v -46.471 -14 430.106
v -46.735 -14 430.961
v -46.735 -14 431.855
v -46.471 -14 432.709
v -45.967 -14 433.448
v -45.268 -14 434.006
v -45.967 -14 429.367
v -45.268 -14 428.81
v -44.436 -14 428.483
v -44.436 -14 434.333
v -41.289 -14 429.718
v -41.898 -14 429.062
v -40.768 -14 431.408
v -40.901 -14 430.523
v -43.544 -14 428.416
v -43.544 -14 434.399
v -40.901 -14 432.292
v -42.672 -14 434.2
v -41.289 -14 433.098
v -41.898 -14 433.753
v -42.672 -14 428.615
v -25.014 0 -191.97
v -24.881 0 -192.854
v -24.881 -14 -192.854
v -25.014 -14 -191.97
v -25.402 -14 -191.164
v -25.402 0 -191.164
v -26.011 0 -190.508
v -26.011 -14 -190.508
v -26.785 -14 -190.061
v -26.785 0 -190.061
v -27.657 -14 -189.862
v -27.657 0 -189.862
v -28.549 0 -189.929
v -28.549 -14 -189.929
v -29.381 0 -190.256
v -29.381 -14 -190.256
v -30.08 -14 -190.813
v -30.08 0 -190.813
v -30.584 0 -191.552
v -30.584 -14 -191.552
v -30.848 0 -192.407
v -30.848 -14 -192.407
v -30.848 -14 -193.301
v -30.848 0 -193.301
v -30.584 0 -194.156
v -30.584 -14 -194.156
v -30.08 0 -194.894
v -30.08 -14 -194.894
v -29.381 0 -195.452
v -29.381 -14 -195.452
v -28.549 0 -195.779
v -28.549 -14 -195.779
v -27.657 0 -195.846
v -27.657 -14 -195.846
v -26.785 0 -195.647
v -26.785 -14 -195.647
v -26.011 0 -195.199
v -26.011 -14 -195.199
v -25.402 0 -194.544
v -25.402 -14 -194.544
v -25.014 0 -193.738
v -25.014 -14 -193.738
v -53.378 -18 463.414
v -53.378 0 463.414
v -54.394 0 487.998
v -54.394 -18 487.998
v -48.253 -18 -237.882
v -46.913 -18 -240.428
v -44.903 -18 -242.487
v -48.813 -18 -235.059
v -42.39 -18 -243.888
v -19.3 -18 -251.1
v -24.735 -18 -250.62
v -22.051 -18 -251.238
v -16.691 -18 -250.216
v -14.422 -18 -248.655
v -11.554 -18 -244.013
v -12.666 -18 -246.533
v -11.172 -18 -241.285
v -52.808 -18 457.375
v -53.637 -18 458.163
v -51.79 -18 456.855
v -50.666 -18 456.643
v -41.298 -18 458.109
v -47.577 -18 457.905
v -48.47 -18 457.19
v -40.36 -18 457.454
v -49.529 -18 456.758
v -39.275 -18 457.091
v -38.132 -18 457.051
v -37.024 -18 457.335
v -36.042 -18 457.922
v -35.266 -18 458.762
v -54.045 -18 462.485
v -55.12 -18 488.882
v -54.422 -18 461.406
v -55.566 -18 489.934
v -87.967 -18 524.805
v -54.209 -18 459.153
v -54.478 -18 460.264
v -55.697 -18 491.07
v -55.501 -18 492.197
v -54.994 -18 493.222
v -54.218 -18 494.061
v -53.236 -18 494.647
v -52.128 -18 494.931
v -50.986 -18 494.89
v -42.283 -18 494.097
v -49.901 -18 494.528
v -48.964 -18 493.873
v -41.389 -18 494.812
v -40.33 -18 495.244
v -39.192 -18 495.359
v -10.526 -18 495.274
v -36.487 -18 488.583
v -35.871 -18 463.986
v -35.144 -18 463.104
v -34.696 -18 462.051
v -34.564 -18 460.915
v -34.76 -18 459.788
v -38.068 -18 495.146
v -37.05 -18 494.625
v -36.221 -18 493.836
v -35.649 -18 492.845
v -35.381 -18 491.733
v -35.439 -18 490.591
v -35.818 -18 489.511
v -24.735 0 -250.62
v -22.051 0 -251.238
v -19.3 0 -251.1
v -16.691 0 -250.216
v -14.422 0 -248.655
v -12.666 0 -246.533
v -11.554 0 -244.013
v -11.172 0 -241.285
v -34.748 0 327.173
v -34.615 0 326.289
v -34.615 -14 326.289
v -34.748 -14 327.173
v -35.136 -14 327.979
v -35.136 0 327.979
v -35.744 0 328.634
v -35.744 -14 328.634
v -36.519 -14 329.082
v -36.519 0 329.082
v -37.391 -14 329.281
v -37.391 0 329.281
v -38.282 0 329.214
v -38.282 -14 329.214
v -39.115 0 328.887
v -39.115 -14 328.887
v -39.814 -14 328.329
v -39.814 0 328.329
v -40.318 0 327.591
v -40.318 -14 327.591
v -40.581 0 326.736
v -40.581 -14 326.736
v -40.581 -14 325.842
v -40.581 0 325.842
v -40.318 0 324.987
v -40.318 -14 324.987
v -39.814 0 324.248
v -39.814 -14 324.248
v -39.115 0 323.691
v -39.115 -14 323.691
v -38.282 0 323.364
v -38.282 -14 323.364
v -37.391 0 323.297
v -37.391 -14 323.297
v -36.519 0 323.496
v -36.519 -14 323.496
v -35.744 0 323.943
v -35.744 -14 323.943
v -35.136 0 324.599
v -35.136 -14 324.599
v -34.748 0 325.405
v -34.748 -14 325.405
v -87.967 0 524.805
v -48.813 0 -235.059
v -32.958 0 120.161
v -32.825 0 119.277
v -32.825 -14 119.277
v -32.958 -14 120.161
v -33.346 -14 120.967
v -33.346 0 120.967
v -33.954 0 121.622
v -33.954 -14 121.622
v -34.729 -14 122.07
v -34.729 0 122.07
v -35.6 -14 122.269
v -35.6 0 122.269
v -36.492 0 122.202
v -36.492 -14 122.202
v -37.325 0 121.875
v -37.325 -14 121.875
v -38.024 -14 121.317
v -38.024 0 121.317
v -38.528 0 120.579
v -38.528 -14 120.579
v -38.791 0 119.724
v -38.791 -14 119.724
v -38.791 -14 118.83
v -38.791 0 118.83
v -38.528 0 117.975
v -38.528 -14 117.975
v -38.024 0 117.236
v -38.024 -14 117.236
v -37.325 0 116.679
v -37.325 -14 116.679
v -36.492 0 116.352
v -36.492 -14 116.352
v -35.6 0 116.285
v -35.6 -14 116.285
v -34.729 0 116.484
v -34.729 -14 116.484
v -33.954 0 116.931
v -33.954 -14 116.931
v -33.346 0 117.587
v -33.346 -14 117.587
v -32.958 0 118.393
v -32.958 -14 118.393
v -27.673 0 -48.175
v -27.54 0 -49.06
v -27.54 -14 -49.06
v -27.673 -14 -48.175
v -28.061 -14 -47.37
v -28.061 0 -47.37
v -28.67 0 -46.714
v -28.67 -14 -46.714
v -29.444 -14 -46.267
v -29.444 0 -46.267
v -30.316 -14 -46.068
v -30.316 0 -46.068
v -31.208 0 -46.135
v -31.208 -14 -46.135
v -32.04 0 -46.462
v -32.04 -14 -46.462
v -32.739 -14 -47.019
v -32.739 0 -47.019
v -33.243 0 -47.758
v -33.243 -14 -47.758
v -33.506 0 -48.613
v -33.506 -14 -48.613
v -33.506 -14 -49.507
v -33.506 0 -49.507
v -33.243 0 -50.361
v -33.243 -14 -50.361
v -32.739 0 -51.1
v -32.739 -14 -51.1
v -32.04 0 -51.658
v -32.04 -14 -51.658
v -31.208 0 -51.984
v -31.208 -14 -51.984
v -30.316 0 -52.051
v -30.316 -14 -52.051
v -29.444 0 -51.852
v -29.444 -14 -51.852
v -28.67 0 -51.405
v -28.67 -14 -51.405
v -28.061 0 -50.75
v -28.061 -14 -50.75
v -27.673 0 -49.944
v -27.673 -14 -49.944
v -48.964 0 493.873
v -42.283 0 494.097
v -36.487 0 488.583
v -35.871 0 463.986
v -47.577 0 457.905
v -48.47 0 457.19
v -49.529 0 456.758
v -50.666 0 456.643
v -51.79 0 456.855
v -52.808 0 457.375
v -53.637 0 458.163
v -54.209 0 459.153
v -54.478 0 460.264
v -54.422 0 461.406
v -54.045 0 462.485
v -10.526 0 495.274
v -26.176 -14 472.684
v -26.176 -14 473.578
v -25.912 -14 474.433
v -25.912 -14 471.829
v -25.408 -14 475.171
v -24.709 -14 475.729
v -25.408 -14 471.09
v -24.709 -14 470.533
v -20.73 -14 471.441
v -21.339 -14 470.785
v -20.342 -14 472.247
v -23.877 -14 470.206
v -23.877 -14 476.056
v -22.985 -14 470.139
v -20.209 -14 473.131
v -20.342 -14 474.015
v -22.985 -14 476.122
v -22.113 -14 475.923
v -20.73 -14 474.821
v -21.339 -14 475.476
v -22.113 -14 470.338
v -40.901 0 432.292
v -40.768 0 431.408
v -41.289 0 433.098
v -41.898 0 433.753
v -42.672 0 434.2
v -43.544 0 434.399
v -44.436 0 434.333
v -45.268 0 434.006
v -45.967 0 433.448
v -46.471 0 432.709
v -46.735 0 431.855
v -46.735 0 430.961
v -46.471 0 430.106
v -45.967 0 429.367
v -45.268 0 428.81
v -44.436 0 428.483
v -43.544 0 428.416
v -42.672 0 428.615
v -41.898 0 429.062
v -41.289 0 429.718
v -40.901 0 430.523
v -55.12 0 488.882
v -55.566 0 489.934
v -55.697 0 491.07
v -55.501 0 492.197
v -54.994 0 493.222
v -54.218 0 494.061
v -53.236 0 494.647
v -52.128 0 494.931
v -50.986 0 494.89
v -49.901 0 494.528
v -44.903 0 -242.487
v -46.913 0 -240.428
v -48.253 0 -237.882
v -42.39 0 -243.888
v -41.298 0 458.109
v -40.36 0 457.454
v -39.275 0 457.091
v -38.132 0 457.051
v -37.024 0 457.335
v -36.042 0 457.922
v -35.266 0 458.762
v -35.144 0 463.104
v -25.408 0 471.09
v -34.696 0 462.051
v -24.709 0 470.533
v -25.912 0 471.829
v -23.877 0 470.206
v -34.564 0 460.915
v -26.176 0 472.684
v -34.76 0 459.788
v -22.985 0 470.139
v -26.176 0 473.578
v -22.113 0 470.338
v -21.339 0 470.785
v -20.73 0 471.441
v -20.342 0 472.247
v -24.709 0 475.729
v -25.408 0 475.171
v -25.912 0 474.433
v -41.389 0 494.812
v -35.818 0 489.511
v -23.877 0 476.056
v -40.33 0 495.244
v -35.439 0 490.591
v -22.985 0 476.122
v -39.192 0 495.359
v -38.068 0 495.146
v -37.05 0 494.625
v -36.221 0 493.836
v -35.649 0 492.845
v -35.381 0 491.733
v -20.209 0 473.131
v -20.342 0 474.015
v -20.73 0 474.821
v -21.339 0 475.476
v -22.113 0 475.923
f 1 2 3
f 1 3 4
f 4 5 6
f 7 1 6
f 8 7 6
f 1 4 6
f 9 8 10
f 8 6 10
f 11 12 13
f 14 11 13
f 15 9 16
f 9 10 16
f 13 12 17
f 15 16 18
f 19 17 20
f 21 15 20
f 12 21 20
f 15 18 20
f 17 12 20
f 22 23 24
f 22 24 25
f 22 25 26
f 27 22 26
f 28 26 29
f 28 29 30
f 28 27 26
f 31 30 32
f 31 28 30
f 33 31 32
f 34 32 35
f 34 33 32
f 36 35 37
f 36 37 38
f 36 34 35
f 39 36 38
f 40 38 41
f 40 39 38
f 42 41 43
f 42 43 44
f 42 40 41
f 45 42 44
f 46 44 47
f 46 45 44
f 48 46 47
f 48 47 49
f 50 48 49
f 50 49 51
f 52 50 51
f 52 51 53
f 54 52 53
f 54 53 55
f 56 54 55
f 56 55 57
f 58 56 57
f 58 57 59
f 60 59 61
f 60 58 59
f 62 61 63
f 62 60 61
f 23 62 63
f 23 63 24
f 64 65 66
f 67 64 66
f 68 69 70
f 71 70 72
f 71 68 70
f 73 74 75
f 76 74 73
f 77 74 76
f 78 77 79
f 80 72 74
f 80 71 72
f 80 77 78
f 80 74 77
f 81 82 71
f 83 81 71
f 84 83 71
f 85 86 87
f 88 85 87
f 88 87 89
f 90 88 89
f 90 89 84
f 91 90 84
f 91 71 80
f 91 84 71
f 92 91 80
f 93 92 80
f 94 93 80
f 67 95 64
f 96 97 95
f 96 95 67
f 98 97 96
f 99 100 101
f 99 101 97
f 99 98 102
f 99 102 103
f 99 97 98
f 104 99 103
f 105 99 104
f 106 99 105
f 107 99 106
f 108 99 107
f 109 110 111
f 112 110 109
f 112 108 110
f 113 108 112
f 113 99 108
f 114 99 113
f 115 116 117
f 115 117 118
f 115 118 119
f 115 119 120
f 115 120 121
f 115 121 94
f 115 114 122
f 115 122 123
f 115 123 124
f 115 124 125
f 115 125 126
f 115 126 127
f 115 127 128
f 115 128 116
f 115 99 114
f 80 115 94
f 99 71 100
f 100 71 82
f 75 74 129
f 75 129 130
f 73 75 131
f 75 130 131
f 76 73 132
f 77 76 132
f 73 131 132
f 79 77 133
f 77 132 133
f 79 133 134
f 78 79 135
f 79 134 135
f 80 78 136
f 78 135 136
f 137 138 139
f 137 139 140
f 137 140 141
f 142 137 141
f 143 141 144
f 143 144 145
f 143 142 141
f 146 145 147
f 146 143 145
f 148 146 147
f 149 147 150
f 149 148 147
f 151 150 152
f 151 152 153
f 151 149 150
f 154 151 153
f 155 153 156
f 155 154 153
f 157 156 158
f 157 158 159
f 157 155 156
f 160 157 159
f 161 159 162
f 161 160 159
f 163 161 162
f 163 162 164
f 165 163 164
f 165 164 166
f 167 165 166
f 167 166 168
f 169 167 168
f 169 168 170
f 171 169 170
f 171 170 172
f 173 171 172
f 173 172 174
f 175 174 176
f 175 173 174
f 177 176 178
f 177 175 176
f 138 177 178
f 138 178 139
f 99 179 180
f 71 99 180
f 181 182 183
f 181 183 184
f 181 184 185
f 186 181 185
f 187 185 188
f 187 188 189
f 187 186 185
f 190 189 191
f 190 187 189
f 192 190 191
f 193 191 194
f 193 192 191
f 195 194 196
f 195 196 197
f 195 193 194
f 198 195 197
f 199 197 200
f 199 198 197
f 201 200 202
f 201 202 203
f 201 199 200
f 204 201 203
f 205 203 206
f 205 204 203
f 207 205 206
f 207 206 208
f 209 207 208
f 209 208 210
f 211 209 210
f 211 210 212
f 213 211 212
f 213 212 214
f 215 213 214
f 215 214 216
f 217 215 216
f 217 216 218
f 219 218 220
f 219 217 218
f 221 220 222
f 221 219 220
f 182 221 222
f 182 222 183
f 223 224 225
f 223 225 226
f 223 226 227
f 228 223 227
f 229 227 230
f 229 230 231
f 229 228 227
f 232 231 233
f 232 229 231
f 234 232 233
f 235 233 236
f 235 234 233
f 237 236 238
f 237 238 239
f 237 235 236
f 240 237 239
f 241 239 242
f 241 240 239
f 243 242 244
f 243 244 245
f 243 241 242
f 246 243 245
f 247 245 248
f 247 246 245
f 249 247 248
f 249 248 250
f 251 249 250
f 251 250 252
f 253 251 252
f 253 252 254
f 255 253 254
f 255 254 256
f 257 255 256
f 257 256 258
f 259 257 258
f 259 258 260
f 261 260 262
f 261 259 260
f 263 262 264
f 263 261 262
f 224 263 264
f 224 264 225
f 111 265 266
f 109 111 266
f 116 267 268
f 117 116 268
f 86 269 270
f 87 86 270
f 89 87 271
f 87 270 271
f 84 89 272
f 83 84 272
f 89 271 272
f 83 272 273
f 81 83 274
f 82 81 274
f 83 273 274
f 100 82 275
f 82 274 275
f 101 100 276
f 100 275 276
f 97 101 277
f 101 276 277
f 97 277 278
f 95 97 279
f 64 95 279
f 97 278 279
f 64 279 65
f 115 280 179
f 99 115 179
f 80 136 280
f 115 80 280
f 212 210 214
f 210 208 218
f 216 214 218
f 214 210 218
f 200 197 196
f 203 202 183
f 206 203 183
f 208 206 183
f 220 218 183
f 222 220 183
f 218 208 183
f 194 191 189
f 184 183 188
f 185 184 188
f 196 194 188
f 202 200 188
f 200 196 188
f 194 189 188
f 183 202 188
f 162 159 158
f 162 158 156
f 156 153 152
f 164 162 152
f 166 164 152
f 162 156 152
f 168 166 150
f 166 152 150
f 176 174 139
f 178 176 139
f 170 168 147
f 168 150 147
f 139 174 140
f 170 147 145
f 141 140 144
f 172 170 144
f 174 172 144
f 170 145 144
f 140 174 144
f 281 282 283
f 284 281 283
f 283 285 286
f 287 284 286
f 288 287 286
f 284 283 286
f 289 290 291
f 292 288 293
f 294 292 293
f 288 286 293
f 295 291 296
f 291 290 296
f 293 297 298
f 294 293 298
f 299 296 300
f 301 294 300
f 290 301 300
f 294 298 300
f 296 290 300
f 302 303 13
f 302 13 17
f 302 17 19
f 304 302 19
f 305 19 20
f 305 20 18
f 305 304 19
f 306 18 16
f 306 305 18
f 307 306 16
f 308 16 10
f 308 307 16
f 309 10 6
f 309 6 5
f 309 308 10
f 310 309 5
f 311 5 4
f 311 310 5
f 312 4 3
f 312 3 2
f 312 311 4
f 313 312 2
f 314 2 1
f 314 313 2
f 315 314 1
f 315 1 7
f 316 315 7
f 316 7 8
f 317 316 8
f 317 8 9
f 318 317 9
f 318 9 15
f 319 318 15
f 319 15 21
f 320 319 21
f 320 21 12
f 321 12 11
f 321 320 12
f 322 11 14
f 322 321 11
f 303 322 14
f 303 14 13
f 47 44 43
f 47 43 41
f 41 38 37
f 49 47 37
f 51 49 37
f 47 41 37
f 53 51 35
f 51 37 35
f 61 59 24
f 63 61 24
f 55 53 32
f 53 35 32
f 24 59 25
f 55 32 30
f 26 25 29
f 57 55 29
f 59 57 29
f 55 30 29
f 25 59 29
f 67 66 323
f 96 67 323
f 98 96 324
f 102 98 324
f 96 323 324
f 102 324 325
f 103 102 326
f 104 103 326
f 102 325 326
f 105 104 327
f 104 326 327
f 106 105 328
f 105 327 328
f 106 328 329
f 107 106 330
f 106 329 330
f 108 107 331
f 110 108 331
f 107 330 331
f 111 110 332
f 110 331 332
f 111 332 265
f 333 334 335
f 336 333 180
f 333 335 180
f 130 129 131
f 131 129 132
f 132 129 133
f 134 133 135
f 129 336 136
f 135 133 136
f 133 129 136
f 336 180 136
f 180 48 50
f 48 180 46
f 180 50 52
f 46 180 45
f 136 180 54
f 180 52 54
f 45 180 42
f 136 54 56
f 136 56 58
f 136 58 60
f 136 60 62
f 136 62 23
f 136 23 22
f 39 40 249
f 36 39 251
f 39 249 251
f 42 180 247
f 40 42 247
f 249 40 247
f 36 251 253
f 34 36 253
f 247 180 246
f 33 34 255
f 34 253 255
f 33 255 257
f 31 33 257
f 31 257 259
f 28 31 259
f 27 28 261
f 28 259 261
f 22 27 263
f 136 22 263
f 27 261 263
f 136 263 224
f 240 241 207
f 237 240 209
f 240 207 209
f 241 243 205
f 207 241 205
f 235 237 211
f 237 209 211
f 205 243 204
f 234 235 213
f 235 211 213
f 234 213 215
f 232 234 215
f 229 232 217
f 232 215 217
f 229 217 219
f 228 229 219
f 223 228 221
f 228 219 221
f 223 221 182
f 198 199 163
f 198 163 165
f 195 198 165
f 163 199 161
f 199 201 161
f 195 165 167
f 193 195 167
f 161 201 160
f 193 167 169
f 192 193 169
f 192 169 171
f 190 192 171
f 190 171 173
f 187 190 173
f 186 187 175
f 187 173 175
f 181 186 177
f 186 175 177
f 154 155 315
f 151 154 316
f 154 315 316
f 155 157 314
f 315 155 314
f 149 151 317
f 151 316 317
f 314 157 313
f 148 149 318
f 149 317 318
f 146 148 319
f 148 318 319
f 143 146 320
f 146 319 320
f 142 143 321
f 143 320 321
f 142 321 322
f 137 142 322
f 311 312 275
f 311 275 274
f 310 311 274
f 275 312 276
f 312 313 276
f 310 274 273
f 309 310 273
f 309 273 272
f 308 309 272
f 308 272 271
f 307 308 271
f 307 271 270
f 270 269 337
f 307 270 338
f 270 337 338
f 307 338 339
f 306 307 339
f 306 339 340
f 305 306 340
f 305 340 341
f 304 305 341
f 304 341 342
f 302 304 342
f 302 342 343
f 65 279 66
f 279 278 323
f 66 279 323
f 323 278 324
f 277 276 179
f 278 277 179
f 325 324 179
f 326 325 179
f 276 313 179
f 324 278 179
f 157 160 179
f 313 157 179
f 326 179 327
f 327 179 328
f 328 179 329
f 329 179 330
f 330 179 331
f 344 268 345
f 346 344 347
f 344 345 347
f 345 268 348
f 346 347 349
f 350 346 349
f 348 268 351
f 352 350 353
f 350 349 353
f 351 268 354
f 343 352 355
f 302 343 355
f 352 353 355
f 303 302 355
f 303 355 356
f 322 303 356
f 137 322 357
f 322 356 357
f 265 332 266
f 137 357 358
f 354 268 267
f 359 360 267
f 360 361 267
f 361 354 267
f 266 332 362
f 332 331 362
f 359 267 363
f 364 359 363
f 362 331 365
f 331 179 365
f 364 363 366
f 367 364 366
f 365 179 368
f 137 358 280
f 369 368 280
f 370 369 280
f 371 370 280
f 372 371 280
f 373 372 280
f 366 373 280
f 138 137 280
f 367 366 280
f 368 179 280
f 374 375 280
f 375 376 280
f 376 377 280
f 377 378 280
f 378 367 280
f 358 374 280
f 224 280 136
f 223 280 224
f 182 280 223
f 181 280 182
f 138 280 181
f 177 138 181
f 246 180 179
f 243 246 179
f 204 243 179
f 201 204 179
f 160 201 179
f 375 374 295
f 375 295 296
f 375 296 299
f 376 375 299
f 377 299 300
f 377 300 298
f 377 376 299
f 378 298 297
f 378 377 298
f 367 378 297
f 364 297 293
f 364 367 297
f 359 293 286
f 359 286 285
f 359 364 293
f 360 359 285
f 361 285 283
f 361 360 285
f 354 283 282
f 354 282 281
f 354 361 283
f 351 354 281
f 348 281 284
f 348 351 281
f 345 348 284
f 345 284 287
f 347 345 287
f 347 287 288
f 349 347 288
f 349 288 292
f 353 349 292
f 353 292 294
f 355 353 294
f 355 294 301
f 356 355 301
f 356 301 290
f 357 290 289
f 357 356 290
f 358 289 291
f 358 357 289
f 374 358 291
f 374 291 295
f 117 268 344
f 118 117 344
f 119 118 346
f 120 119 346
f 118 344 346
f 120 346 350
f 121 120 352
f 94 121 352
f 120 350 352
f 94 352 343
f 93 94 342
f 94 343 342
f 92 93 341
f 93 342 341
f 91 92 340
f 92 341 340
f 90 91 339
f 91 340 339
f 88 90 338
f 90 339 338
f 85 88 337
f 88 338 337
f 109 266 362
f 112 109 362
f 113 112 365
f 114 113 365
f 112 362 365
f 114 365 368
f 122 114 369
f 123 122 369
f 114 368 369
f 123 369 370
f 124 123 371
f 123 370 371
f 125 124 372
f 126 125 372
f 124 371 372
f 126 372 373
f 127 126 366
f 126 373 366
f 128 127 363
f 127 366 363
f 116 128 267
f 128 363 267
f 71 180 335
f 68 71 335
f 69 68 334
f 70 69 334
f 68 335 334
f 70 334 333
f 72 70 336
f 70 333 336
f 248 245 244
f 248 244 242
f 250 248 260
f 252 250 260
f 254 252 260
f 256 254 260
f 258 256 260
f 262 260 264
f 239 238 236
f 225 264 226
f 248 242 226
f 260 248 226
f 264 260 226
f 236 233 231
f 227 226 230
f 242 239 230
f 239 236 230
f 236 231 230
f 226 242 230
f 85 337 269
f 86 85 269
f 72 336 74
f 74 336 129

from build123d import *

# Parameters (mm, degrees)
F0_R     = 3
F1_DEPTH = 18
F2_DEPTH = 14


# Not quite as in the source:
# - ends of sketch curves that miss each other by under 0.0002 mm in the source are joined


with BuildPart() as f1:
    # F0 (on Front) → F1 (new body)
    with BuildSketch(Plane.XZ):
        with BuildLine():
            Line((-42.3895305789, -243.8882939158), (-24.7354158314, -250.6203213983))
            ThreePointArc((-24.7354158314, -250.6203213983), (-15.5028330705, -249.5140993631), (-11.1723924415, -241.2853938543))
            Line((-11.1723924415, -241.2853938543), (-10.5257942379, 495.2740080398))
            Line((-10.5257942379, 495.2740080398), (-87.9671722006, 524.8046568947))
            Line((-87.9671722006, 524.8046568947), (-48.8132548023, -235.0591811233))
            ThreePointArc((-48.8132548023, -235.0591811233), (-46.9127527413, -240.4278329279), (-42.3895305789, -243.8882939158))
        make_face()
        with Locations((-27.881012126, -192.8539189117)):
            Circle(F0_R, mode=Mode.SUBTRACT)
        with Locations((-30.5399937075, -49.059701124)):
            Circle(F0_R, mode=Mode.SUBTRACT)
        with Locations((-35.8245981399, 119.2769033151)):
            Circle(F0_R, mode=Mode.SUBTRACT)
        with Locations((-37.6148353963, 326.2889456799)):
            Circle(F0_R, mode=Mode.SUBTRACT)
        with BuildLine():
            ThreePointArc((-35.8713849562, 463.9863896495), (-35.6237850386, 458.3139596858), (-41.2978981422, 458.1085140717))
            Line((-41.2978981422, 458.1085140717), (-47.5773687005, 457.9045057833))
            ThreePointArc((-47.5773687005, 457.9045057833), (-53.2508540354, 457.7393262229), (-53.3777836629, 463.4137960782))
            Line((-53.3777836629, 463.4137960782), (-54.3935717097, 487.9983330149))
            ThreePointArc((-54.3935717097, 487.9983330149), (-54.636241933, 493.6693642066), (-48.9636796908, 493.8731318846))
            Line((-48.9636796908, 493.8731318846), (-42.2828997396, 494.0973559272))
            ThreePointArc((-42.2828997396, 494.0973559272), (-36.6071005964, 494.2603360531), (-36.4869165759, 488.5834695431))
            Line((-36.4869165759, 488.5834695431), (-35.8713849562, 463.9863896495))
        make_face(mode=Mode.SUBTRACT)
        with Locations((-43.7681841537, 431.407725542)):
            Circle(F0_R, mode=Mode.SUBTRACT)
        with Locations((-23.2091454593, 473.1308742023)):
            Circle(F0_R, mode=Mode.SUBTRACT)
        with Locations((-43.7681841537, 431.407725542)):
            Circle(F0_R)
        with Locations((-23.2091454593, 473.1308742023)):
            Circle(F0_R)
        with Locations((-37.6148353963, 326.2889456799)):
            Circle(F0_R)
        with Locations((-35.8245981399, 119.2769033151)):
            Circle(F0_R)
        with Locations((-27.881012126, -192.8539189117)):
            Circle(F0_R)
        with Locations((-30.5399937075, -49.059701124)):
            Circle(F0_R)
    extrude(amount=F1_DEPTH)

    # F0 (on Front) → F2 (cut)
    with BuildSketch(Plane.XZ):
        with Locations((-43.7681841537, 431.407725542)):
            Circle(F0_R)
        with Locations((-23.2091454593, 473.1308742023)):
            Circle(F0_R)
        with Locations((-37.6148353963, 326.2889456799)):
            Circle(F0_R)
        with Locations((-35.8245981399, 119.2769033151)):
            Circle(F0_R)
        with Locations((-27.881012126, -192.8539189117)):
            Circle(F0_R)
        with Locations((-30.5399937075, -49.059701124)):
            Circle(F0_R)
    extrude(amount=F2_DEPTH, mode=Mode.SUBTRACT)


solid = f1.part
